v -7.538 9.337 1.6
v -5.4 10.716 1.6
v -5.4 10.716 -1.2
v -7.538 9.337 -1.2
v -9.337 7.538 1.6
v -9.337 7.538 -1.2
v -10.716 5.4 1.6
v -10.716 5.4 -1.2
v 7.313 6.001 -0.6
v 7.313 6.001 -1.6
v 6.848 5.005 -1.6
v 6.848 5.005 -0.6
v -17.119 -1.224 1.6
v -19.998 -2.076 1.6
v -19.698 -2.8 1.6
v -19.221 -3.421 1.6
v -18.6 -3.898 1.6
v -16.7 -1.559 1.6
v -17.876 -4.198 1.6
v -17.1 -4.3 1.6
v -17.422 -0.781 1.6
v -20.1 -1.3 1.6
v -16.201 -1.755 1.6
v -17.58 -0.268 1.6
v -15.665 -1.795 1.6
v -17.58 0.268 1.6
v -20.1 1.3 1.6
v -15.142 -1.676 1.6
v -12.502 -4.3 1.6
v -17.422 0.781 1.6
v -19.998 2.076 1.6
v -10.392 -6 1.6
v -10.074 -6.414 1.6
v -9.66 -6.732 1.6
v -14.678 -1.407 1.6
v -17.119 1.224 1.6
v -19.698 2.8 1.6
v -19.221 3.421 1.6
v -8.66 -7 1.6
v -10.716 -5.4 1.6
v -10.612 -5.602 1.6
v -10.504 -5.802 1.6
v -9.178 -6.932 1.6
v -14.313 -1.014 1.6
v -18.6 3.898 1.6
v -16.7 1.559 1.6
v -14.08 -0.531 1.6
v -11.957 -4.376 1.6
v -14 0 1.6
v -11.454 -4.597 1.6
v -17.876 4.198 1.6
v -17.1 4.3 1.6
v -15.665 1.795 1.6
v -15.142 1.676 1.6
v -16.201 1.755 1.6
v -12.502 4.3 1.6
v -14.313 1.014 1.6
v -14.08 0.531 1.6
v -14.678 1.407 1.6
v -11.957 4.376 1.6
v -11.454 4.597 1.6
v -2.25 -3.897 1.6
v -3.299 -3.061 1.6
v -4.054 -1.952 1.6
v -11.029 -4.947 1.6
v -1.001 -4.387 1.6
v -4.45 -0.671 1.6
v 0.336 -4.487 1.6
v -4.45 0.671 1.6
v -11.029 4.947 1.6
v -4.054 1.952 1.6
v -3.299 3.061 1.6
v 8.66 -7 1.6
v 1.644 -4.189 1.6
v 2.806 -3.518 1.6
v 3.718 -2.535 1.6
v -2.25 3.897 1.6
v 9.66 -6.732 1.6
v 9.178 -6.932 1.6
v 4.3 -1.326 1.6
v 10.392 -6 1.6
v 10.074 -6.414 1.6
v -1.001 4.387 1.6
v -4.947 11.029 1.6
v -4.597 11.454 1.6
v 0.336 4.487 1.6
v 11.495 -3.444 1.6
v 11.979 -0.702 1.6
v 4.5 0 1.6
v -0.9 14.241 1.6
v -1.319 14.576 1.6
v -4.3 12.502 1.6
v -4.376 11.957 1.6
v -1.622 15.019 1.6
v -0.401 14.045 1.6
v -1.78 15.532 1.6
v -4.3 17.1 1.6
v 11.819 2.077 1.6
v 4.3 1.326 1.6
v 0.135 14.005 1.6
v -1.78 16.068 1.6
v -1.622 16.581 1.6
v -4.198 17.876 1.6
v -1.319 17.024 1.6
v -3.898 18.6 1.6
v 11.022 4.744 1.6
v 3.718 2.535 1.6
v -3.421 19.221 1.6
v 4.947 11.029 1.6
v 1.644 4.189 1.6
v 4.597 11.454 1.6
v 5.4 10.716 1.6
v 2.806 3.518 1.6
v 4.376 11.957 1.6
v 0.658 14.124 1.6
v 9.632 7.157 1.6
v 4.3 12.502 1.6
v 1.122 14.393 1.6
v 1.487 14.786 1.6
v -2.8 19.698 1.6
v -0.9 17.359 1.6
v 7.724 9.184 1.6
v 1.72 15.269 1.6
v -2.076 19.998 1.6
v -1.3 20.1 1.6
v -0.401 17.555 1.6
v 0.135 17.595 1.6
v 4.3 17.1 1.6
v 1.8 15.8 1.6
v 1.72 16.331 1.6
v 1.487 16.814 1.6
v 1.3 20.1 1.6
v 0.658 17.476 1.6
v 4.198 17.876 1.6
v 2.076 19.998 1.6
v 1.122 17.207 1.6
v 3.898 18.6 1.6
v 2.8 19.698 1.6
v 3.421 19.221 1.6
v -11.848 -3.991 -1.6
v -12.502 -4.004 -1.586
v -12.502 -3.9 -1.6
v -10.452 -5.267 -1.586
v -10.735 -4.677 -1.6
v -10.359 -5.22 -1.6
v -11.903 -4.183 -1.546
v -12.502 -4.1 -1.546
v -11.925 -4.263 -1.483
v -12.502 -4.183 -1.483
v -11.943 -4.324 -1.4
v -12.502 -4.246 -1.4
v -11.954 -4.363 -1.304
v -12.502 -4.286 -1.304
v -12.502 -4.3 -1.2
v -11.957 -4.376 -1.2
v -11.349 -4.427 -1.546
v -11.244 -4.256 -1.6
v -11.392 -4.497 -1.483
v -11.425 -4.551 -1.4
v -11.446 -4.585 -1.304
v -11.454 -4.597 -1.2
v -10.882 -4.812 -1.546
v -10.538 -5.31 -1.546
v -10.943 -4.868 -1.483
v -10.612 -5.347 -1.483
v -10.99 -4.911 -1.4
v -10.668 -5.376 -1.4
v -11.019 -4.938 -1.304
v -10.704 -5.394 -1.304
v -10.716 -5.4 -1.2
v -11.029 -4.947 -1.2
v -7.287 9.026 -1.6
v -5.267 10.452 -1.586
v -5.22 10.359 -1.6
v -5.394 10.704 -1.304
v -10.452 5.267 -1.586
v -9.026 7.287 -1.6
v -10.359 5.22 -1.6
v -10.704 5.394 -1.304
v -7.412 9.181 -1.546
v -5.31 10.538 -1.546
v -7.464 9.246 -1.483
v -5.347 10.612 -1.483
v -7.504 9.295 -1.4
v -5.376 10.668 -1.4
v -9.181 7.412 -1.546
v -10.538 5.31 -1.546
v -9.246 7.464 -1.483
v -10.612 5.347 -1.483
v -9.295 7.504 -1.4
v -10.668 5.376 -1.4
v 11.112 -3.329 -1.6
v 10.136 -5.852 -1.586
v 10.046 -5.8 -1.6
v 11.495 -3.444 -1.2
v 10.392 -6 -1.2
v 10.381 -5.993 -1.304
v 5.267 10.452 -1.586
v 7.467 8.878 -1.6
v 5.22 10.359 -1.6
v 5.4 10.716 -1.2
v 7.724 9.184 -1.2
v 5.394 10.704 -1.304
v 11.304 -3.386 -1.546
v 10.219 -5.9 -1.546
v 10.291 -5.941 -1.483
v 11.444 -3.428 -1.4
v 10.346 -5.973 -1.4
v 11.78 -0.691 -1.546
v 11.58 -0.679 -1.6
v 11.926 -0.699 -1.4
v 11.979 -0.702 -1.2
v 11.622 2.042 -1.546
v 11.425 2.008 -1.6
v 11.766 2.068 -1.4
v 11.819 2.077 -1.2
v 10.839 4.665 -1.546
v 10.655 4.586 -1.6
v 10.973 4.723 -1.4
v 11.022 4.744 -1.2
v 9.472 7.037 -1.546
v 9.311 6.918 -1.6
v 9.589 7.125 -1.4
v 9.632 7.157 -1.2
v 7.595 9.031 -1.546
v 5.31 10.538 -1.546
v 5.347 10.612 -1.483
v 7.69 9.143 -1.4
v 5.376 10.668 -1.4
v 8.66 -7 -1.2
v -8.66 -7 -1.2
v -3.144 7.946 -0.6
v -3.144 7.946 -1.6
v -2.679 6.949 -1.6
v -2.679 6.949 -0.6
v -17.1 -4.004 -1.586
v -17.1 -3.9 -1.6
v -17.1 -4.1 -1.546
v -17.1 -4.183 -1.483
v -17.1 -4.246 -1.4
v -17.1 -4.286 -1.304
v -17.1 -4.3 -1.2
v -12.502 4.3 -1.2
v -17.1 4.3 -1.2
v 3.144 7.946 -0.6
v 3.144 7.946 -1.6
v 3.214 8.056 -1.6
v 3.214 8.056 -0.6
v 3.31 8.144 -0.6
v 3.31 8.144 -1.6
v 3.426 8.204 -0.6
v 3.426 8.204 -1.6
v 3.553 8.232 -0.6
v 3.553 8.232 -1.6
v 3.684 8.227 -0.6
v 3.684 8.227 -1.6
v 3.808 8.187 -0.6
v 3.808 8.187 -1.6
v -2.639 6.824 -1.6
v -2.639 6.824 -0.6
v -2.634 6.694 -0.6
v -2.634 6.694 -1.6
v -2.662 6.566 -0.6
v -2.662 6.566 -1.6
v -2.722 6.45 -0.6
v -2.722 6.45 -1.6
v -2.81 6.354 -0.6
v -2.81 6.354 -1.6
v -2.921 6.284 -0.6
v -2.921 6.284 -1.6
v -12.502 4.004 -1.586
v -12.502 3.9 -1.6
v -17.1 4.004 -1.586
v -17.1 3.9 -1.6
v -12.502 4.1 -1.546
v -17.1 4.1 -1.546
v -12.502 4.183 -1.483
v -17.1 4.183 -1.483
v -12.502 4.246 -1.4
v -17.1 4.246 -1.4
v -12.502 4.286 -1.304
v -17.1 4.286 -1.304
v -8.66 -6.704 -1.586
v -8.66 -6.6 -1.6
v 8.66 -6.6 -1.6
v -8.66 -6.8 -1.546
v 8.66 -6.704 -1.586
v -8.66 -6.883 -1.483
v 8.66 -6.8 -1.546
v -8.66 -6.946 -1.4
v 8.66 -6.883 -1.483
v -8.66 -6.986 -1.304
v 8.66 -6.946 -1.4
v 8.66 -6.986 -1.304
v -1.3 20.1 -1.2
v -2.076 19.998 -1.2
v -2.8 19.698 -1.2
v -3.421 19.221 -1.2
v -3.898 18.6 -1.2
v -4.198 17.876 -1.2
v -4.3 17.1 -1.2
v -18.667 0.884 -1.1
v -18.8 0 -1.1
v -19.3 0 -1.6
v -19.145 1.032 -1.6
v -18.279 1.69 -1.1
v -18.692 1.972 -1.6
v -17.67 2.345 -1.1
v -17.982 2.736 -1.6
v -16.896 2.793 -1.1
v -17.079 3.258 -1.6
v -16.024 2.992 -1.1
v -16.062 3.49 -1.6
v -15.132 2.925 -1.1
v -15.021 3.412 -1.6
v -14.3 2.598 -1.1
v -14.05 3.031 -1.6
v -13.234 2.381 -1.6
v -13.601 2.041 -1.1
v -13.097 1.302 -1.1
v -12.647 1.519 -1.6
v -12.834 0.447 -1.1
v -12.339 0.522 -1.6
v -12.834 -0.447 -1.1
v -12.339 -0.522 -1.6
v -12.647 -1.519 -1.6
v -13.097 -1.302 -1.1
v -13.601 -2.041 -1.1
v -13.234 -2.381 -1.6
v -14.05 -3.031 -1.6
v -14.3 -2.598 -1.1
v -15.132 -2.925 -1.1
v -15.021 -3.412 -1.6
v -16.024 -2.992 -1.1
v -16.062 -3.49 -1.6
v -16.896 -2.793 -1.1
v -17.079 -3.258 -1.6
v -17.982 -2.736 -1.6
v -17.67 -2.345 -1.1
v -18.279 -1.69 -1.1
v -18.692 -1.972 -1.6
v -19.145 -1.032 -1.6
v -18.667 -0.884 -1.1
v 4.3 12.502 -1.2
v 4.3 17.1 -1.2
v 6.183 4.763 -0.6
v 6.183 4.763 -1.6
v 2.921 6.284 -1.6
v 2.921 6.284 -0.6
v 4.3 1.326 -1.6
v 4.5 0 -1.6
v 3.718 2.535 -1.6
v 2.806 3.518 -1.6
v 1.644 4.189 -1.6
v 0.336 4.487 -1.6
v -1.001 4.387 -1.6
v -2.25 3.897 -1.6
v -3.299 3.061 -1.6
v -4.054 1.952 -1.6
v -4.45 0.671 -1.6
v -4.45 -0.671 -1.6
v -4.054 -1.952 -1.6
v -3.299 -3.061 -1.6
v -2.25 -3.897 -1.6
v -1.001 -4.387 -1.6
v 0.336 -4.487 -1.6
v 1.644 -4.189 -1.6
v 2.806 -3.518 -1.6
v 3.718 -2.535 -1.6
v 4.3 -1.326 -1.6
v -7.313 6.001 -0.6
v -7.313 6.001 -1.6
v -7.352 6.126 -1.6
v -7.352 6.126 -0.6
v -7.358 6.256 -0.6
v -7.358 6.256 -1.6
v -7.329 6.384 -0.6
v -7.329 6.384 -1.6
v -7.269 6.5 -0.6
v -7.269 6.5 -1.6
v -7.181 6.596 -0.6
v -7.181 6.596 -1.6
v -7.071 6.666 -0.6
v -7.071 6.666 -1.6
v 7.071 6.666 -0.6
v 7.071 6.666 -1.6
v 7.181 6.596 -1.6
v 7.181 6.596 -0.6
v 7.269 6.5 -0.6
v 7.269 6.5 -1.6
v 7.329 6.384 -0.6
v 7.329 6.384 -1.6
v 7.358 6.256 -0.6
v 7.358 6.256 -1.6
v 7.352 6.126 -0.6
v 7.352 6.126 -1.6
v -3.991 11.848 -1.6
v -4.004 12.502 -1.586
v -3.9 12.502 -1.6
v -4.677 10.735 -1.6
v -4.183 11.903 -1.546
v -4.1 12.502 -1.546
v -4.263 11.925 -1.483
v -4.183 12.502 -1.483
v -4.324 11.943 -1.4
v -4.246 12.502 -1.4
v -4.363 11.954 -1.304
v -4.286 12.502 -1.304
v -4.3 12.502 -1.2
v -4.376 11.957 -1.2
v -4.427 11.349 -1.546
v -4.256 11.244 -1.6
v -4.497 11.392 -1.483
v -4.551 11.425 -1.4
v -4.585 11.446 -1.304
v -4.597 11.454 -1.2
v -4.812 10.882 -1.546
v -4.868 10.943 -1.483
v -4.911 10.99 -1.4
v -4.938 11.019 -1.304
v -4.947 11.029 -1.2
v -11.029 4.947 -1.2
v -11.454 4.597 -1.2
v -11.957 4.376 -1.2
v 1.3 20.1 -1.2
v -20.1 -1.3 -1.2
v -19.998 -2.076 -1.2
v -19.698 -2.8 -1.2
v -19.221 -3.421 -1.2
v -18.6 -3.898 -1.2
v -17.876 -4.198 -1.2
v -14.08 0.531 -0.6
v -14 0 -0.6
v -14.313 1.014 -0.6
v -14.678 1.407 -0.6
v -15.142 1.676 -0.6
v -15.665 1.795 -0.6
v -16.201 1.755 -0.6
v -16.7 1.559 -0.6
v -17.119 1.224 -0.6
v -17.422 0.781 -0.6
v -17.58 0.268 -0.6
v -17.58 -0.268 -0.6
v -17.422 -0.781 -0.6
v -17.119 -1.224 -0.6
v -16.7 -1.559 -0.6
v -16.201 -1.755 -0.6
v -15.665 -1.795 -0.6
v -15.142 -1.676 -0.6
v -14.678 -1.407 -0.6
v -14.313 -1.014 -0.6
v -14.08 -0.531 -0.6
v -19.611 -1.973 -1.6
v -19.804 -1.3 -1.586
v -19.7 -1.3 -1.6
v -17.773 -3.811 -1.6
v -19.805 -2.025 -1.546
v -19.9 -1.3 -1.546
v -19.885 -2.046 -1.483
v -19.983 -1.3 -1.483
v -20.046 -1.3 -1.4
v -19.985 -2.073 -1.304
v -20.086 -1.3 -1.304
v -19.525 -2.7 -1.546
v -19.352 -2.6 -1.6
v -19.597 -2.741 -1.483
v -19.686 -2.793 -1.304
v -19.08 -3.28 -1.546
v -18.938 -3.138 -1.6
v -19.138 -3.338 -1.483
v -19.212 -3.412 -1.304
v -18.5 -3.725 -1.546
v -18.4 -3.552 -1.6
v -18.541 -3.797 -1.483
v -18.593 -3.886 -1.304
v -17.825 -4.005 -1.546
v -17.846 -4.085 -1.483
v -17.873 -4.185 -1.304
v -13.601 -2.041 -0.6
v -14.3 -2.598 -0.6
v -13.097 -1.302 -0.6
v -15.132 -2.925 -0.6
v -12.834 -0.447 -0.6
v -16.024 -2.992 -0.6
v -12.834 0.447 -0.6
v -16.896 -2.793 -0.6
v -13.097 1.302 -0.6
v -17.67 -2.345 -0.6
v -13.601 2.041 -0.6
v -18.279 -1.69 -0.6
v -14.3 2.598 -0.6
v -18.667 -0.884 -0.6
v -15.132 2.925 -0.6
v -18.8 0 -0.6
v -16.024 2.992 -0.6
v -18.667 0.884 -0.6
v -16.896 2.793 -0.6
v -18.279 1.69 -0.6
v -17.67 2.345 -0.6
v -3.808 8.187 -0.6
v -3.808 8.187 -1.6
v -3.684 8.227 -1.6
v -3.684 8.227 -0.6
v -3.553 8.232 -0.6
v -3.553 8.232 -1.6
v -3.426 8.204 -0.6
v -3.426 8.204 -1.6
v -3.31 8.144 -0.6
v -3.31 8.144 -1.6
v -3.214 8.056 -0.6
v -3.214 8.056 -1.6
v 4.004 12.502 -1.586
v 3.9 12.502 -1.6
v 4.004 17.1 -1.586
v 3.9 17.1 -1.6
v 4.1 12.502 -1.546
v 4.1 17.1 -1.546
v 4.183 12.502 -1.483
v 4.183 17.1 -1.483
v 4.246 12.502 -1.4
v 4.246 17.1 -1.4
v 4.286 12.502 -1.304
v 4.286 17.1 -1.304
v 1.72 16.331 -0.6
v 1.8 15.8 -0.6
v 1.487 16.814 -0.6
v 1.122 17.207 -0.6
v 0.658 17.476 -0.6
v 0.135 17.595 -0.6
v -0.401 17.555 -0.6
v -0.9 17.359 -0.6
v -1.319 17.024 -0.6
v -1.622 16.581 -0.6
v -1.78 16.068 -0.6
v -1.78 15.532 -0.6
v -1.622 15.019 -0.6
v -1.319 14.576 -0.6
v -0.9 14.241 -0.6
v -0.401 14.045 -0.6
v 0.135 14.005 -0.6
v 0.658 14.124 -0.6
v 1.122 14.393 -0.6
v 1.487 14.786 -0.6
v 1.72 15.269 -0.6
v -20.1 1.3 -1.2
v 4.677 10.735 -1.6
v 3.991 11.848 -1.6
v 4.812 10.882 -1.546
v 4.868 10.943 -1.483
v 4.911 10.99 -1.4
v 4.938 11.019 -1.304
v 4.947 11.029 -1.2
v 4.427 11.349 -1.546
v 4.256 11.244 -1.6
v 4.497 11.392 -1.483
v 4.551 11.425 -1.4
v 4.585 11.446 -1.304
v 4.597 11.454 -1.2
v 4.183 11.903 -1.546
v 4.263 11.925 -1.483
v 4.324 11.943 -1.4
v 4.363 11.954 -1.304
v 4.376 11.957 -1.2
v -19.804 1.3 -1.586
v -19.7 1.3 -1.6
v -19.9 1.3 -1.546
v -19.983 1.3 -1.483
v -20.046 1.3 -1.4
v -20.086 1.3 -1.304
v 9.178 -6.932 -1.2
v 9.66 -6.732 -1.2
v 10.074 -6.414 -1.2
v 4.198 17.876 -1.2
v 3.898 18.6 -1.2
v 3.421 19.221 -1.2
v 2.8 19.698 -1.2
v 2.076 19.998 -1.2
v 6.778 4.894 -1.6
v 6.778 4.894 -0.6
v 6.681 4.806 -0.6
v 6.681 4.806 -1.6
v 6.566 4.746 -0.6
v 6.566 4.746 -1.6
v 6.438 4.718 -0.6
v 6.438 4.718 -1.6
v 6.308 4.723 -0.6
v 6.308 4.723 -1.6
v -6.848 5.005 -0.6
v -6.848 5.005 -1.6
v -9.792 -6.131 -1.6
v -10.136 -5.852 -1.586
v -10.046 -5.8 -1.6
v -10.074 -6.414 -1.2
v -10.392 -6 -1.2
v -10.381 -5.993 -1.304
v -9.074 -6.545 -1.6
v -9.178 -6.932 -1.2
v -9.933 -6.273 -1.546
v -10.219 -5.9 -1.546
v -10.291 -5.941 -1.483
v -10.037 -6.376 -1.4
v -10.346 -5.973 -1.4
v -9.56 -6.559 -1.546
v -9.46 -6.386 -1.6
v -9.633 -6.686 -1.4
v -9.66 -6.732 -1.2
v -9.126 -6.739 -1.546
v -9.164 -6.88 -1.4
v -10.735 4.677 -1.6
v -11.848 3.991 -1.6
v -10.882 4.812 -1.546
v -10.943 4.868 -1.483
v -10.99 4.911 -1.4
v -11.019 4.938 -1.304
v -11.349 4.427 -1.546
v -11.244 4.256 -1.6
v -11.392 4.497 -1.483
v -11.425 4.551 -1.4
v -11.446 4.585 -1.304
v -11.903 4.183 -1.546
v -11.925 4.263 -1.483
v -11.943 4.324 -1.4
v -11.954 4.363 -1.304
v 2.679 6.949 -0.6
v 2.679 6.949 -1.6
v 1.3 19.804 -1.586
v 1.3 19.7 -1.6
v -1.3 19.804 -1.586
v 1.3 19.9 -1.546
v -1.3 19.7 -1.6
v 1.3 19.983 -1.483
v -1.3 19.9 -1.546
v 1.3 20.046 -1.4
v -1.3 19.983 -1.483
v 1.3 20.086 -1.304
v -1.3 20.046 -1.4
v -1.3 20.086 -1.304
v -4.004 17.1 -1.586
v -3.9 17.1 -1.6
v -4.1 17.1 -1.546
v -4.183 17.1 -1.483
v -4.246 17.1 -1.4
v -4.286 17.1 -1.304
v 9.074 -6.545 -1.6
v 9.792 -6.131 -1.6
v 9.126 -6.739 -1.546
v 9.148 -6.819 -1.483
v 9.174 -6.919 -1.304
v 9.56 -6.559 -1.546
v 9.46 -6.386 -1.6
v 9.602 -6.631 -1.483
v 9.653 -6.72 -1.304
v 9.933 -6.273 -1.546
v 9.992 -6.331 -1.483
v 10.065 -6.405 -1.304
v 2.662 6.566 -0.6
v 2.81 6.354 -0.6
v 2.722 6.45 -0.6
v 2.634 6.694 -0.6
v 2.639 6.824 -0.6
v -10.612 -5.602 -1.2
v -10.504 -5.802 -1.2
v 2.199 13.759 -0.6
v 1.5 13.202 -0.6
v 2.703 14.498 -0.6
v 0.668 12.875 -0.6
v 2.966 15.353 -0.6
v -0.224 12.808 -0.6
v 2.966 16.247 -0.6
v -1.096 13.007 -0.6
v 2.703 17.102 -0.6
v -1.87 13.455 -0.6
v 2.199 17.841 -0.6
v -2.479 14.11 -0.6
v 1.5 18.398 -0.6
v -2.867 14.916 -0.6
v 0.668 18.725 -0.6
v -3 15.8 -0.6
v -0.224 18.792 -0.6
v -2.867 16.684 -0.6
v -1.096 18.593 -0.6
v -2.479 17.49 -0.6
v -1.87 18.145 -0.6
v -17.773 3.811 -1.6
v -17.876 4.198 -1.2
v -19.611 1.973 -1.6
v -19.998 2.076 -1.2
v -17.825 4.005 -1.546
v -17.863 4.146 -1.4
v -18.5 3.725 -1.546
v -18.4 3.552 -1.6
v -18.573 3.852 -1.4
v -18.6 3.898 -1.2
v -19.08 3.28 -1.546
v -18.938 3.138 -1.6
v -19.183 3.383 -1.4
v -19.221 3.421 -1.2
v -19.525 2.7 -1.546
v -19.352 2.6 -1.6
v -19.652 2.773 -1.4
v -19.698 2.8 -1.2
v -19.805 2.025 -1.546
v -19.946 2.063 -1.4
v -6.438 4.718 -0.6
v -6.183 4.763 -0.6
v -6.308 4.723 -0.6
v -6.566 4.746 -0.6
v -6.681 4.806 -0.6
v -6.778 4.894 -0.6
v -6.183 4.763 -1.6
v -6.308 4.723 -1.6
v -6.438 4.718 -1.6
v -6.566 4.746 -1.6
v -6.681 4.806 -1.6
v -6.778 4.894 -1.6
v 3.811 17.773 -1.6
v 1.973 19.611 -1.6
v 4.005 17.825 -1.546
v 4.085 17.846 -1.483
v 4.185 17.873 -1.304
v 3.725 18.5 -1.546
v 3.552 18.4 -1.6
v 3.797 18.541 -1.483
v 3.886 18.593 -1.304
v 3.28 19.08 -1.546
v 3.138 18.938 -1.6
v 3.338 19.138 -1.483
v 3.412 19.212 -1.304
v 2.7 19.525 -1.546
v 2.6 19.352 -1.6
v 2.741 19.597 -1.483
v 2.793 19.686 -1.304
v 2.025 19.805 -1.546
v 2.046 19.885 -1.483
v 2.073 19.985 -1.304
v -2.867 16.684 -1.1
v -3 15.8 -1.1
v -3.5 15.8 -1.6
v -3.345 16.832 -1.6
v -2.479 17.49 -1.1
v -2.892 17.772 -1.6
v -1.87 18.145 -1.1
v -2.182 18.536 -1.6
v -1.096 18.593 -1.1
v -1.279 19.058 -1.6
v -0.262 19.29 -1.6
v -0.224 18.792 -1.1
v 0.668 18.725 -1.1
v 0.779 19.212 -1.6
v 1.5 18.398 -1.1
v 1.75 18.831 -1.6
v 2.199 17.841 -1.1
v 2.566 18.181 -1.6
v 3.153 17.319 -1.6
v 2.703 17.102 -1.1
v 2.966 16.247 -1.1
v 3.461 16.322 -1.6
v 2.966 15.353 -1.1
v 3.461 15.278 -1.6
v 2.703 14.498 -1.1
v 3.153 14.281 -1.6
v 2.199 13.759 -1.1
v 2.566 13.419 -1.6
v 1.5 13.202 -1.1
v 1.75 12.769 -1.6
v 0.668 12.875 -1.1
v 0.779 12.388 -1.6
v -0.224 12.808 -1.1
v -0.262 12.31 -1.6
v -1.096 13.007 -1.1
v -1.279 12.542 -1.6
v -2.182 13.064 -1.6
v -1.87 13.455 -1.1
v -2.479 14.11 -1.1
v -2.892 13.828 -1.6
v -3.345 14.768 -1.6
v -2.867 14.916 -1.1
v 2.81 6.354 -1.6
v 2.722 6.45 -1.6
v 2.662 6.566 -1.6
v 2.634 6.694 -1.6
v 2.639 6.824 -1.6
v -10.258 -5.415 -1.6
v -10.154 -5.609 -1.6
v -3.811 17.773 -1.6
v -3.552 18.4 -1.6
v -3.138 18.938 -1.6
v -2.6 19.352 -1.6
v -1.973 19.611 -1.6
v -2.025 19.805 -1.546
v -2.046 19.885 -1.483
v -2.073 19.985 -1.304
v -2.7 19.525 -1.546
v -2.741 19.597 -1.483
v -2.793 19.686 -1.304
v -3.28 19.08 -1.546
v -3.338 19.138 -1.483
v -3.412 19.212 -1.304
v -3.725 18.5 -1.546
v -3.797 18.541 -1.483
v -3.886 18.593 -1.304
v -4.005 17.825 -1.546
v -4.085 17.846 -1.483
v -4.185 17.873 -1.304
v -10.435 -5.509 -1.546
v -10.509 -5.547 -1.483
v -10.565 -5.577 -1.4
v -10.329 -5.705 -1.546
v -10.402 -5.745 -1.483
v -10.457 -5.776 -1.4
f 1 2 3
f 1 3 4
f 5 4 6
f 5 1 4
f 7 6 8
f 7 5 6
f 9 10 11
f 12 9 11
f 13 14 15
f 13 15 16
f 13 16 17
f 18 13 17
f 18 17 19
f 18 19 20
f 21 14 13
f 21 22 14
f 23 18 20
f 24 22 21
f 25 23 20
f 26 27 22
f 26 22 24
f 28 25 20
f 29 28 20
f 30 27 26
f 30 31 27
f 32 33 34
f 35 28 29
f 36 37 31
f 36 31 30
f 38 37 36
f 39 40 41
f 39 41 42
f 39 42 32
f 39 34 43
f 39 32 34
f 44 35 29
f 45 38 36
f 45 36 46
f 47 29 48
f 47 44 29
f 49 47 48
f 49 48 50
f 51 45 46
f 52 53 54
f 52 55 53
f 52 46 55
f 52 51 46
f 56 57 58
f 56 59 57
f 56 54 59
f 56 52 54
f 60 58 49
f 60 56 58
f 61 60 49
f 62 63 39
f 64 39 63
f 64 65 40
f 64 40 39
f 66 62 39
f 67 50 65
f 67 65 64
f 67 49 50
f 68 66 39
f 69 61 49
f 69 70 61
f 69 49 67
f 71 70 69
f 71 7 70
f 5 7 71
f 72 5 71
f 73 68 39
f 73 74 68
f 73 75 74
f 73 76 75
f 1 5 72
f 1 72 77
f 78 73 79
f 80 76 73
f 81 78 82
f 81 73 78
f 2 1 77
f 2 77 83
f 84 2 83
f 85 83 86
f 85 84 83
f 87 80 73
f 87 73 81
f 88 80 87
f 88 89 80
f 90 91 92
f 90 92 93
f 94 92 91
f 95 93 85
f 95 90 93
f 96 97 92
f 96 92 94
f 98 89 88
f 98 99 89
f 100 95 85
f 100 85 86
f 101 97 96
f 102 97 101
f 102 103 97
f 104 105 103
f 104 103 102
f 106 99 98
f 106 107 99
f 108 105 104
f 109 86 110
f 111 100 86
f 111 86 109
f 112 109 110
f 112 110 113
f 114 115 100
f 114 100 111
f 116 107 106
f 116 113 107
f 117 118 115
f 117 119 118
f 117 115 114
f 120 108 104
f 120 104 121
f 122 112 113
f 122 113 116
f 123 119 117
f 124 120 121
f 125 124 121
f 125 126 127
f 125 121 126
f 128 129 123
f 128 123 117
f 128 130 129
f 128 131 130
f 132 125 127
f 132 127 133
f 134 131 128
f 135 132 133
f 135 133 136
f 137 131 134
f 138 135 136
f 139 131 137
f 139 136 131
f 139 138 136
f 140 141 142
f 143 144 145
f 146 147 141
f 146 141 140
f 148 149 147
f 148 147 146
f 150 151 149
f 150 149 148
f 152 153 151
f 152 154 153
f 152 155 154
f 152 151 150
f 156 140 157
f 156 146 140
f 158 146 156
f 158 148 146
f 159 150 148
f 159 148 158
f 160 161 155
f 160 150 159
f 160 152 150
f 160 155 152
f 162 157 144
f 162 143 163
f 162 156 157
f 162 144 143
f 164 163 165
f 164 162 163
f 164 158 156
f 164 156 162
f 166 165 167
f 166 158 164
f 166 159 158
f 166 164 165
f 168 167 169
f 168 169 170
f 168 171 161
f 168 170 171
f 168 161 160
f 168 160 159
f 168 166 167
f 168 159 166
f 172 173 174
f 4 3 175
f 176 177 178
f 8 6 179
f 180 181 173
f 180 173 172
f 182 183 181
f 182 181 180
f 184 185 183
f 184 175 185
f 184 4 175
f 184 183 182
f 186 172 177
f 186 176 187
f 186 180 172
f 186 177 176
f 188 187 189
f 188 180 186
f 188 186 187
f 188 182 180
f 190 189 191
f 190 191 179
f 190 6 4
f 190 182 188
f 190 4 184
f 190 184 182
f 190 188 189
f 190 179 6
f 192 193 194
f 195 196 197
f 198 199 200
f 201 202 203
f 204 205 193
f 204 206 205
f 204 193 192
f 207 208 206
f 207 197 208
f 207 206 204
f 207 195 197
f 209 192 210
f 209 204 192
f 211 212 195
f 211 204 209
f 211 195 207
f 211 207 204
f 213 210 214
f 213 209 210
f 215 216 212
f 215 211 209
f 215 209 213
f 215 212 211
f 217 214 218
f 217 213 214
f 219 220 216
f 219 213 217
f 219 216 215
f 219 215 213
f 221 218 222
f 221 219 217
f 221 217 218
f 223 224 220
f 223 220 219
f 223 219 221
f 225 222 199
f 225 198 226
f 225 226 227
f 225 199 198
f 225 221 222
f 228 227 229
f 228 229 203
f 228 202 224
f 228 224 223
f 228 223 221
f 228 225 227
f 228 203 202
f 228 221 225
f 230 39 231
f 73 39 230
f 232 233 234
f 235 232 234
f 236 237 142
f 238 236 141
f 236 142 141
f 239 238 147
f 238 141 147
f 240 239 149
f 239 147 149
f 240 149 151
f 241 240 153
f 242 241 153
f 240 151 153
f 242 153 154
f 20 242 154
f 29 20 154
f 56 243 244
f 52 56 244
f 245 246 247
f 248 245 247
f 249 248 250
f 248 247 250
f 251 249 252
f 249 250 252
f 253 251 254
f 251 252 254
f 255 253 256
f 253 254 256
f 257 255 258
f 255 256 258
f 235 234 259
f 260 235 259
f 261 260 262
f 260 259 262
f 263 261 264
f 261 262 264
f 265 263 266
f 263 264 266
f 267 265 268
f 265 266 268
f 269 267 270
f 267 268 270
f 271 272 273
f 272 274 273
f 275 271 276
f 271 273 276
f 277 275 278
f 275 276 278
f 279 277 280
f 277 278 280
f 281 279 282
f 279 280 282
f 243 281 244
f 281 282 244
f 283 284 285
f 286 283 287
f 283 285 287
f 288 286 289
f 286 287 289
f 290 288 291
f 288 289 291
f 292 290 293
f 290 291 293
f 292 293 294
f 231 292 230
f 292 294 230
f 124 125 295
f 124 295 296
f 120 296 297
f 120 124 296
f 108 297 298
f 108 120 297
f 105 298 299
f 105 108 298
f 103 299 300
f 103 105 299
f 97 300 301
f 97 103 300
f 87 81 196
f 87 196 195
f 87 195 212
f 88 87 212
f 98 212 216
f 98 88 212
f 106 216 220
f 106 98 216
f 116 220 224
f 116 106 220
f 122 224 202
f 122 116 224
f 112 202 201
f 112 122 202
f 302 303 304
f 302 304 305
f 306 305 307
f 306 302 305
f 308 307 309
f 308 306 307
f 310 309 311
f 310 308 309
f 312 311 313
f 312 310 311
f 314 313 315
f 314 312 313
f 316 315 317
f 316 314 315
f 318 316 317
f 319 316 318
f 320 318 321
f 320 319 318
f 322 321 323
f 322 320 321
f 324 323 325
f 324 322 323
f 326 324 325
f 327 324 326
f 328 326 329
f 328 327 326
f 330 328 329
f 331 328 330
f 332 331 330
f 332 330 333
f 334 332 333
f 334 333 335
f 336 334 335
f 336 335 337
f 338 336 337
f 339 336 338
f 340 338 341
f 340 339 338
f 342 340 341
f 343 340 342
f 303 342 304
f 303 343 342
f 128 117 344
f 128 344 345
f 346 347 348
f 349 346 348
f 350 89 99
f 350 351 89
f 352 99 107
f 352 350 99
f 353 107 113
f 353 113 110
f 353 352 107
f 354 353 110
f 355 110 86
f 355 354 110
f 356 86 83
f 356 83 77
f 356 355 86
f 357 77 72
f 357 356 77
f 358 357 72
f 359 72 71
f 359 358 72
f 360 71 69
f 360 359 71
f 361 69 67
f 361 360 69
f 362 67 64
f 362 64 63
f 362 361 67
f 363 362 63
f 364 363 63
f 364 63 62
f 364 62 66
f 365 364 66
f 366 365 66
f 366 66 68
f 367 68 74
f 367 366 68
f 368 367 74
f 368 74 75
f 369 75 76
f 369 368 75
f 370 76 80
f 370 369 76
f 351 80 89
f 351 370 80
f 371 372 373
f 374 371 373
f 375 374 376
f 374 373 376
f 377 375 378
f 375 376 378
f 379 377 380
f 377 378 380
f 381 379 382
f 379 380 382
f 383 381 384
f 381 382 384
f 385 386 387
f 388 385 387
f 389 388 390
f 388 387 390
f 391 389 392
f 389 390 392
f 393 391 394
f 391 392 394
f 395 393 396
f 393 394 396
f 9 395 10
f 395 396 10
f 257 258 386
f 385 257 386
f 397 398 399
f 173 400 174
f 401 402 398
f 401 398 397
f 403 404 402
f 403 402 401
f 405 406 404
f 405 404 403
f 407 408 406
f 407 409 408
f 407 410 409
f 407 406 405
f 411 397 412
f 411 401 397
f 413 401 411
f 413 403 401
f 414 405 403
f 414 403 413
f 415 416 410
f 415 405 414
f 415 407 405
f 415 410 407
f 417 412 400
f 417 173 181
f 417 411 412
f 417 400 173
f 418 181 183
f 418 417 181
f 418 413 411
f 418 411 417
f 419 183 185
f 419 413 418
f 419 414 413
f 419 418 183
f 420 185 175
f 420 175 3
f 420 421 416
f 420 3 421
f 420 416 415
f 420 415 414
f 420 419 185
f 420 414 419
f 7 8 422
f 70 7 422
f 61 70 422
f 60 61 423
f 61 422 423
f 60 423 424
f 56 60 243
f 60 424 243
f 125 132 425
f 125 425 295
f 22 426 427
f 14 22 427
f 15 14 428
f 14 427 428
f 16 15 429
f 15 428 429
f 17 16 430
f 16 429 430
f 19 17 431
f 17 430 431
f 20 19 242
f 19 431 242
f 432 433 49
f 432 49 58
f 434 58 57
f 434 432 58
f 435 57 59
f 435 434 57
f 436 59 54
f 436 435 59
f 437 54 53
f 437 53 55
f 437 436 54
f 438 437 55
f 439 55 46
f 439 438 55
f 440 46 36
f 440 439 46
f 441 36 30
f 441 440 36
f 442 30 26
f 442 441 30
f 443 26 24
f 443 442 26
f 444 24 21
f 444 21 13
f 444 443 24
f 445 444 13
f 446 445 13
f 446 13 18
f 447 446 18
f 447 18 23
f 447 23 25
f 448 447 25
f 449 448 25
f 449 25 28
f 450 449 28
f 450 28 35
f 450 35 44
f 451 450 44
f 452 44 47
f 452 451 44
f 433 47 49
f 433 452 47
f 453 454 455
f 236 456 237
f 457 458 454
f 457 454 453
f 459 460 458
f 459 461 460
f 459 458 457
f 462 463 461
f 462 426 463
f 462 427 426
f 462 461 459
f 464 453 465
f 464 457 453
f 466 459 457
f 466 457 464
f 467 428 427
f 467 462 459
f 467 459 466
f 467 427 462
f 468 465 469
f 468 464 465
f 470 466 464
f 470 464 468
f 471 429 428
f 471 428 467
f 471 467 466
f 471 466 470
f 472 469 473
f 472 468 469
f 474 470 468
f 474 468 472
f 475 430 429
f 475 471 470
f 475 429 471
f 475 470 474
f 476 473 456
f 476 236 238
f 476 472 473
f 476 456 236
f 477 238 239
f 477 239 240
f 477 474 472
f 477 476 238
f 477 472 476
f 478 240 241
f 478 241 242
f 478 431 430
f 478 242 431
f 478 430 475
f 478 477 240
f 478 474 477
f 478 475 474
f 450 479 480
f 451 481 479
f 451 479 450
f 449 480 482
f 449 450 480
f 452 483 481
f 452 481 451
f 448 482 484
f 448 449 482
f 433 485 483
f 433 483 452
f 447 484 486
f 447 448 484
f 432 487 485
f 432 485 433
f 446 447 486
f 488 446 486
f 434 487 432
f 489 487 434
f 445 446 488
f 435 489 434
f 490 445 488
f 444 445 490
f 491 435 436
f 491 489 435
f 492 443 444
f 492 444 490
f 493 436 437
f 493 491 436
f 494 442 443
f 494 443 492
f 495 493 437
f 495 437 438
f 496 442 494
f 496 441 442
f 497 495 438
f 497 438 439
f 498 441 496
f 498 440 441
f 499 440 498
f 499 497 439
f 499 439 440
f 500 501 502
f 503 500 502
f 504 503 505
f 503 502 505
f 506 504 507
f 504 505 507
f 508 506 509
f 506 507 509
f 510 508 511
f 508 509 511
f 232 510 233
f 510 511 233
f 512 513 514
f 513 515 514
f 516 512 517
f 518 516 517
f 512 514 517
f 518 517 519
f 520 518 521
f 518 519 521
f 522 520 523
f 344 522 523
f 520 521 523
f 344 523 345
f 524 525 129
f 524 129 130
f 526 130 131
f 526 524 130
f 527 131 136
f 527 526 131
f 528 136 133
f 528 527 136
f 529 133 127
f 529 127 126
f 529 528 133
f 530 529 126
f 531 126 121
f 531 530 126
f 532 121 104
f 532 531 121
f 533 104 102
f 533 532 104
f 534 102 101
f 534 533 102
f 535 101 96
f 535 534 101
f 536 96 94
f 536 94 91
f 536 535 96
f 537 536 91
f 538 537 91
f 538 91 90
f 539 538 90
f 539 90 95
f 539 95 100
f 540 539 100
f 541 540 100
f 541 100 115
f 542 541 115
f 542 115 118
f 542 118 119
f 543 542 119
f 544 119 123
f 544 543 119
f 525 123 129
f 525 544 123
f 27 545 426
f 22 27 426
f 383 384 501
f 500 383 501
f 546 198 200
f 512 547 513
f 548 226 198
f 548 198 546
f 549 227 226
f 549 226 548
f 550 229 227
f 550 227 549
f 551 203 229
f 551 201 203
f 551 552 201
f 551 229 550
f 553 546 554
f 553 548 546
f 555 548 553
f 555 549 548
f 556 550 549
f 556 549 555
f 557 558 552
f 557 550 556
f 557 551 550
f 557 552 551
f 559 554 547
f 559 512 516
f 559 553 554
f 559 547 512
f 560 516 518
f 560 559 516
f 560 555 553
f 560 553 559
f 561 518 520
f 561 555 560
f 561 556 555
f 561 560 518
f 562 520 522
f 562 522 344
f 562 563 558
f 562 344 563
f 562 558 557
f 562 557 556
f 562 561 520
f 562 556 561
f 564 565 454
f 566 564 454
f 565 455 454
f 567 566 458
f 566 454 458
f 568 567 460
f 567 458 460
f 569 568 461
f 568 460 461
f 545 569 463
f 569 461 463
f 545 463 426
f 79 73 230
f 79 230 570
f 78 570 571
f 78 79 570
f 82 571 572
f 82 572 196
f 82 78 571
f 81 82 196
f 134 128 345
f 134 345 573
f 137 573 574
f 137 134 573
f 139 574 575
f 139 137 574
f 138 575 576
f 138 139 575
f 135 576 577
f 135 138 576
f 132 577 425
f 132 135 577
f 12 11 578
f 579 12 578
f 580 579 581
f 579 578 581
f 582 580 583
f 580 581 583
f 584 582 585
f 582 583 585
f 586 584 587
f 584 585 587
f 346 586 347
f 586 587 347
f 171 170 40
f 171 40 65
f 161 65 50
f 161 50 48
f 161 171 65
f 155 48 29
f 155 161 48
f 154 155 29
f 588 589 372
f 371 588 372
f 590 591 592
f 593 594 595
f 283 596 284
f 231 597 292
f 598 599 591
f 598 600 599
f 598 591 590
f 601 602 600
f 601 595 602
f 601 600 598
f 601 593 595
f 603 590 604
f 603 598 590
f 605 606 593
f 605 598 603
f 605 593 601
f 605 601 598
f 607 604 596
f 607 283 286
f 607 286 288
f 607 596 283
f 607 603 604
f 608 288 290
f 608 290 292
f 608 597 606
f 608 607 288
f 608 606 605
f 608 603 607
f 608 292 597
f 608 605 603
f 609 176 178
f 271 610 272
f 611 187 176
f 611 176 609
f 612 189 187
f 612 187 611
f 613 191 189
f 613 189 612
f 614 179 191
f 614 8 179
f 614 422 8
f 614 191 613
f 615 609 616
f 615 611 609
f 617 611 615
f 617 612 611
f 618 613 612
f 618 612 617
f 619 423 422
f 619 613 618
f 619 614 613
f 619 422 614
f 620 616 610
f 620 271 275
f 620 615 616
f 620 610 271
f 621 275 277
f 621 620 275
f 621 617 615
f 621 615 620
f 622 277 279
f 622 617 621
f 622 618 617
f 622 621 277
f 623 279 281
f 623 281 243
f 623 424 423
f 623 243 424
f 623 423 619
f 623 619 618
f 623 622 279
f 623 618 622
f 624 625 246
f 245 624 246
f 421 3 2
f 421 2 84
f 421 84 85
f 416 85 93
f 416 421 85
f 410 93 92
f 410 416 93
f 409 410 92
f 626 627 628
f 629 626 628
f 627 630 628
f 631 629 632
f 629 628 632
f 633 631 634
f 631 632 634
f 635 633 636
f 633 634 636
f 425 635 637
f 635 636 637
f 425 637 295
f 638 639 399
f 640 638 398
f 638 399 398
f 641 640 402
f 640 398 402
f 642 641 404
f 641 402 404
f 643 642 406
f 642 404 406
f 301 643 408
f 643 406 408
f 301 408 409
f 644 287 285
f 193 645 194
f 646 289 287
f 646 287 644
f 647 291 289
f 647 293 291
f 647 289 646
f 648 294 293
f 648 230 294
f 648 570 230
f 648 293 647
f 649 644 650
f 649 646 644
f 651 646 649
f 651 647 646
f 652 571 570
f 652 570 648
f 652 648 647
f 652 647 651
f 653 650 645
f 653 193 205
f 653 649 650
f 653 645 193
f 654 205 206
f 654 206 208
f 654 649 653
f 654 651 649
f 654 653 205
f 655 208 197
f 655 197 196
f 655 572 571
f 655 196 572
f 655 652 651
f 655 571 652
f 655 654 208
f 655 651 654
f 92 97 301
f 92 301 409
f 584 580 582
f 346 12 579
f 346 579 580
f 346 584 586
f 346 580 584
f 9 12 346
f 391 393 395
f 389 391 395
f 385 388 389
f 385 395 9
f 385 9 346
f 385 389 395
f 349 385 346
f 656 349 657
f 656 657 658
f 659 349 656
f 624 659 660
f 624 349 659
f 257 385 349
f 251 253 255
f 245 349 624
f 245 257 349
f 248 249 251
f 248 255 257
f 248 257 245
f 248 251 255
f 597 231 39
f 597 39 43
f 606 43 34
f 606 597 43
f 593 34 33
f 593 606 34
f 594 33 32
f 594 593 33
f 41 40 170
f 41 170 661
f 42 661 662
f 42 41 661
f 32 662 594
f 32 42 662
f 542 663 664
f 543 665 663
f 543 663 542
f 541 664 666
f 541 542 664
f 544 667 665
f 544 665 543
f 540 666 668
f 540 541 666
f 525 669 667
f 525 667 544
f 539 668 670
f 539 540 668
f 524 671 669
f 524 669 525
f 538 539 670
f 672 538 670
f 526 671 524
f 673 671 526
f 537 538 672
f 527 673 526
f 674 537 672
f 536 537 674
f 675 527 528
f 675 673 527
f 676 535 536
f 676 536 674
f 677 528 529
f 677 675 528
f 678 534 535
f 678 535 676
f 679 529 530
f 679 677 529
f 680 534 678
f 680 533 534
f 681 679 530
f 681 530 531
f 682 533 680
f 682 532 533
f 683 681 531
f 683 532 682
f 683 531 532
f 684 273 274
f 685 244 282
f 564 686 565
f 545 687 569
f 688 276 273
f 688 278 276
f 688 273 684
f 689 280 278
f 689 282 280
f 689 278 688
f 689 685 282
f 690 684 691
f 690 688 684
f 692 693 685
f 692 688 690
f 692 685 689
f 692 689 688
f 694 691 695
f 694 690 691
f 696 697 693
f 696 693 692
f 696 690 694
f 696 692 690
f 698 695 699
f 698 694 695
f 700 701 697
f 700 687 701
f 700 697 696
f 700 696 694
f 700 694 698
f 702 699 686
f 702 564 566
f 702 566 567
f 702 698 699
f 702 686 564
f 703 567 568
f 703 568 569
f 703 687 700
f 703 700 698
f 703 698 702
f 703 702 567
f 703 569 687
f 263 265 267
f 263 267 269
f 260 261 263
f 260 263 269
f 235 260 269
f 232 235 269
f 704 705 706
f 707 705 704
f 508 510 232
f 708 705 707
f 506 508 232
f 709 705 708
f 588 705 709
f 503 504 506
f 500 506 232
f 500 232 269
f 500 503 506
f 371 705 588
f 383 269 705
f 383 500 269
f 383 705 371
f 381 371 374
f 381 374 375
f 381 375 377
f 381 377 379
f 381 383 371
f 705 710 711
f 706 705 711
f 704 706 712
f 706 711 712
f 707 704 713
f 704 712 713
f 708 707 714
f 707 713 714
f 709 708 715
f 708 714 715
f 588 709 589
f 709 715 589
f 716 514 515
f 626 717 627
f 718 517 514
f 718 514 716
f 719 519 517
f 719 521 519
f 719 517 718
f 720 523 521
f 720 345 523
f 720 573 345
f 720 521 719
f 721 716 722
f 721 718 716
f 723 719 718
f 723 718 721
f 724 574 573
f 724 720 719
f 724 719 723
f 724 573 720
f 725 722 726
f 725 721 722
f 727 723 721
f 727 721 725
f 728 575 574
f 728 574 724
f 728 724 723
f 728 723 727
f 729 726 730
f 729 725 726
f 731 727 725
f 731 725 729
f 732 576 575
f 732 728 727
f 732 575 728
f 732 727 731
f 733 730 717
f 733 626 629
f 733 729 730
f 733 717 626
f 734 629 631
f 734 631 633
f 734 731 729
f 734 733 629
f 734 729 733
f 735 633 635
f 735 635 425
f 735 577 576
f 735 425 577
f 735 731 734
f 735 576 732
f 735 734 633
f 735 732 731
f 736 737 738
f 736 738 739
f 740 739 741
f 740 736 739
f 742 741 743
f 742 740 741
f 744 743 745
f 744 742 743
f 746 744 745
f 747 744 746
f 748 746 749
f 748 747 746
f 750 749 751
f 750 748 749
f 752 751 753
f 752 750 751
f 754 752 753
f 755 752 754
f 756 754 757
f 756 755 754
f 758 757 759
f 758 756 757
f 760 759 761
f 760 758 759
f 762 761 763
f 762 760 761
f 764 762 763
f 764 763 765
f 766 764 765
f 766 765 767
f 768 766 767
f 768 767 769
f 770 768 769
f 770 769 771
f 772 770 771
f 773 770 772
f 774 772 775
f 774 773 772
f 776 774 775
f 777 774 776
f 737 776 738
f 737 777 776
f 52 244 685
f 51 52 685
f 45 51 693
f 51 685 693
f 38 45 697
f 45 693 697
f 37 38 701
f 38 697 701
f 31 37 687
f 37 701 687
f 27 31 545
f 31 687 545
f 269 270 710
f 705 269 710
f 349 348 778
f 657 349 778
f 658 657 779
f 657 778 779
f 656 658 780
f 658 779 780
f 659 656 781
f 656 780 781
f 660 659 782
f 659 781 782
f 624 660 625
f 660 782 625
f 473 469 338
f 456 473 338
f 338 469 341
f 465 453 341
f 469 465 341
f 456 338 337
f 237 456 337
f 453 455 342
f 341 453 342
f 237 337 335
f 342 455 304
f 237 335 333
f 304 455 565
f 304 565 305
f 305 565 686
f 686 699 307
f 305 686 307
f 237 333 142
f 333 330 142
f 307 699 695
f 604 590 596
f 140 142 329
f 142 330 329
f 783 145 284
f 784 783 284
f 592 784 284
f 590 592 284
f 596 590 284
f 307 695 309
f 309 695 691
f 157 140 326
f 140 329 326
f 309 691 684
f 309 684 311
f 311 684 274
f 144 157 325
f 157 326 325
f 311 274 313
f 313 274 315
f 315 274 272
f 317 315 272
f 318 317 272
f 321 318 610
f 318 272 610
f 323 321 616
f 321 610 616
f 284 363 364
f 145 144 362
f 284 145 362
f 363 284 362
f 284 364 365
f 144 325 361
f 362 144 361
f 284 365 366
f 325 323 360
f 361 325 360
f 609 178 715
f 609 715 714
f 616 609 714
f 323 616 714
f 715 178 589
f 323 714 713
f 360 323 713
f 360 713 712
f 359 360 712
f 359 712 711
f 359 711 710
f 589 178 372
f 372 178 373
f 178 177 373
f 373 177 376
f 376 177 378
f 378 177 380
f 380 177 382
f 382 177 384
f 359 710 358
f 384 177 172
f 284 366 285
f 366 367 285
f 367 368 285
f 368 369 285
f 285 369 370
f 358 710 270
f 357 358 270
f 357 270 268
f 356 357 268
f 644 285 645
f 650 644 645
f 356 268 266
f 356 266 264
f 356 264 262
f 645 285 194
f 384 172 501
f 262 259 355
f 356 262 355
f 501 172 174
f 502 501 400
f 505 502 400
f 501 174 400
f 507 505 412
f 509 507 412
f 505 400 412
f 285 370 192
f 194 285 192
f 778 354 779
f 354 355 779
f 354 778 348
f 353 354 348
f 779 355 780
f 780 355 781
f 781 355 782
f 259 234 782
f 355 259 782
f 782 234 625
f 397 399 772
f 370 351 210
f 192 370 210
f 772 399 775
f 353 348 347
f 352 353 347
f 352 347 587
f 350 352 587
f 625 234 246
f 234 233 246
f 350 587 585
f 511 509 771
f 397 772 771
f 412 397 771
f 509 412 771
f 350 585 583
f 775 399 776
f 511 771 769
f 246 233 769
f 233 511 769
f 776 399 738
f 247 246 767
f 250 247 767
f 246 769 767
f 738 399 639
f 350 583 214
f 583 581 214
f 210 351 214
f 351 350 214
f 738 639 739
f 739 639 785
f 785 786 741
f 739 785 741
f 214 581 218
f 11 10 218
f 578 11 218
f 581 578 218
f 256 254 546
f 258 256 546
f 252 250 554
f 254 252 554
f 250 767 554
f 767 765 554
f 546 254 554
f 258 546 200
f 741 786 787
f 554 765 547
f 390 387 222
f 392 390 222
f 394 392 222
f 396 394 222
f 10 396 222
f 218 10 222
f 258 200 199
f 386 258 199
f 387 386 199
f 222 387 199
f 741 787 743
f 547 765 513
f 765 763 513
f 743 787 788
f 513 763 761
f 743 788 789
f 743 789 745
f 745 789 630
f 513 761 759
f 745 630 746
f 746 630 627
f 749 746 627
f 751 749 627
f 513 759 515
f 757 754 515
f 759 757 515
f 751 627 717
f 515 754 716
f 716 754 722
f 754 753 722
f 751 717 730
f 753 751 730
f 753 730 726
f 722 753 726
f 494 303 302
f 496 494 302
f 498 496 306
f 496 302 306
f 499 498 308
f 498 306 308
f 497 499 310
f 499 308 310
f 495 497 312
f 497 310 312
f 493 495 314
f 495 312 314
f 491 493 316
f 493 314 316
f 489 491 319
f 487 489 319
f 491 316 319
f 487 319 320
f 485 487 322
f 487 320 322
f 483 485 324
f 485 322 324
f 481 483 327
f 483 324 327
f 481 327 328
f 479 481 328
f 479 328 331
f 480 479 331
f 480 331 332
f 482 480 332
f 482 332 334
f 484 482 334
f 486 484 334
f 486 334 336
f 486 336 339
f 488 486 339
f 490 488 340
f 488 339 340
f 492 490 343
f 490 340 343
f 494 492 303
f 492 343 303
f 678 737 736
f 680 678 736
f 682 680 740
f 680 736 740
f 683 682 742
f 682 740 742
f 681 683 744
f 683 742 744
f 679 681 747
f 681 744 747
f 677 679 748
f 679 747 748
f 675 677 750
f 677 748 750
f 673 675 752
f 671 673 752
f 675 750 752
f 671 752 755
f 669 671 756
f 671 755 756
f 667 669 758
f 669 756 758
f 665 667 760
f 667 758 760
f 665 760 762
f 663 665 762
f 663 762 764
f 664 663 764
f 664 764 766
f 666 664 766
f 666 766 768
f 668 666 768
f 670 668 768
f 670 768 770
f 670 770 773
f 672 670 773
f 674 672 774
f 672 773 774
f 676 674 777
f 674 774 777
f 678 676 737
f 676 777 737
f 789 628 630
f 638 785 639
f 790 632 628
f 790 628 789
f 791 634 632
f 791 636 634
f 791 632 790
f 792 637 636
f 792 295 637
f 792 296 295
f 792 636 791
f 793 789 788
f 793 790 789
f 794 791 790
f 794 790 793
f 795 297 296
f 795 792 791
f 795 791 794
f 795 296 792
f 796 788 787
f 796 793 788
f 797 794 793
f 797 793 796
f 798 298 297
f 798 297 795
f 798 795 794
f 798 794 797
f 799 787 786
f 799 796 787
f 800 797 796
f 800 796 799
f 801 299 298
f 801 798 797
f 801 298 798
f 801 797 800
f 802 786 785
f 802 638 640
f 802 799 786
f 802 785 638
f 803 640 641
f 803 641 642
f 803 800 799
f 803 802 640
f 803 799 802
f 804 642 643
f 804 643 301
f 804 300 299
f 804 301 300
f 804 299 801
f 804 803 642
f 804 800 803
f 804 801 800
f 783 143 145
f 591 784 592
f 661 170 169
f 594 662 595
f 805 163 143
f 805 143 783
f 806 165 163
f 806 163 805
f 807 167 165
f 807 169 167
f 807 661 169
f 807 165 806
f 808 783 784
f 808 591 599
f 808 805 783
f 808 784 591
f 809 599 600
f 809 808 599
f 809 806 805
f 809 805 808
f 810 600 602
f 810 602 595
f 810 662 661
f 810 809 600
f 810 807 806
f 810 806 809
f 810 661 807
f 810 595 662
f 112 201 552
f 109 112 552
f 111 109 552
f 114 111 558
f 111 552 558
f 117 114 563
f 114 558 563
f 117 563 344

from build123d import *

# Parameters (mm, degrees)
SKETCH10_R          = 4.5
BOSS_EXTRUDE6_DEPTH = 1.6
SKETCH13_R          = 1.8
BOSS_EXTRUDE7_DEPTH = 1.6
FILLET1_R           = 2
CUT_EXTRUDE2_DEPTH  = 1
SKETCH16_R          = 3
CUT_EXTRUDE3_DEPTH  = 1
CHAMFER1_SIZE       = 0.5
FILLET2_R           = 0.4


with BuildPart() as part:
    # Sketch10 → Boss-Extrude6 (new body, symmetric)
    with BuildSketch(Plane.XY):
        with BuildLine():
            Line((-9.746794345, -7), (9.746794345, -7))
            ThreePointArc((9.746794345, -7), (0, 12), (-9.746794345, -7))
        make_face()
        Circle(SKETCH10_R, mode=Mode.SUBTRACT)
    extrude(amount=BOSS_EXTRUDE6_DEPTH, both=True)

    # Sketch13 → Boss-Extrude7 (add, symmetric)
    with BuildSketch(Plane.XY):
        with BuildLine():
            Line((-11.203124564, 4.3), (-17.1, 4.3))
            ThreePointArc((-17.1, 4.3), (-19.221320344, 3.421320344), (-20.1, 1.3))
            Line((-20.1, 1.3), (-20.1, -1.3))
            ThreePointArc((-20.1, -1.3), (-19.221320344, -3.421320344), (-17.1, -4.3))
            Line((-17.1, -4.3), (-11.203124564, -4.3))
            ThreePointArc((-11.203124564, -4.3), (-12, 0), (-11.203124564, 4.3))
        make_face()
        with Locations((-15.8, 0)):
            Circle(SKETCH13_R, mode=Mode.SUBTRACT)
        with BuildLine():
            Line((4.3, 11.203124564), (4.3, 17.1))
            ThreePointArc((4.3, 17.1), (3.421320344, 19.221320344), (1.3, 20.1))
            Line((1.3, 20.1), (-1.3, 20.1))
            ThreePointArc((-1.3, 20.1), (-3.421320344, 19.221320344), (-4.3, 17.1))
            Line((-4.3, 17.1), (-4.3, 11.203124564))
            ThreePointArc((-4.3, 11.203124564), (0, 12), (4.3, 11.203124564))
        make_face()
        with Locations((0, 15.8)):
            Circle(SKETCH13_R, mode=Mode.SUBTRACT)
    extrude(amount=BOSS_EXTRUDE7_DEPTH, both=True)

    # Fillet1
    fillet1_edges = [part.edges().sort_by_distance(p)[0] for p in [
        (-11.203124564, -4.3, 0),
        (-11.203124564, 4.3, 0),
        (-4.3, 11.203124564, 0),
        (4.3, 11.203124564, 0),
        (9.746794345, -7, 0),
        (-9.746794345, -7, 0),
    ]]
    fillet(fillet1_edges, radius=FILLET1_R)

    # Sketch15 → Cut-Extrude2 (cut)
    with BuildSketch(Plane(origin=(0, 0, -1.6), x_dir=(-1, 0, 0), z_dir=(0, 0, -1))):
        with BuildLine():
            Line((-3.808047036, 8.187368684), (-7.070755069, 6.665942941))
            ThreePointArc((-7.070755069, 6.665942941), (-7.329292249, 6.38379912), (-7.312599832, 6.001479917))
            Line((-7.312599832, 6.001479917), (-6.847719744, 5.004541351))
            ThreePointArc((-6.847719744, 5.004541351), (-6.565575922, 4.746004172), (-6.18325672, 4.762696589))
            Line((-6.18325672, 4.762696589), (-2.920548686, 6.284122331))
            ThreePointArc((-2.920548686, 6.284122331), (-2.662011507, 6.566266153), (-2.678703924, 6.948585355))
            Line((-2.678703924, 6.948585355), (-3.143584012, 7.945523921))
            ThreePointArc((-3.143584012, 7.945523921), (-3.425727833, 8.204061101), (-3.808047036, 8.187368684))
        make_face()
        with BuildLine():
            Line((6.847719744, 5.004541351), (7.312599832, 6.001479917))
            ThreePointArc((7.312599832, 6.001479917), (7.329292249, 6.38379912), (7.070755069, 6.665942941))
            Line((7.070755069, 6.665942941), (3.808047036, 8.187368684))
            ThreePointArc((3.808047036, 8.187368684), (3.425727833, 8.204061101), (3.143584012, 7.945523921))
            Line((3.143584012, 7.945523921), (2.678703924, 6.948585355))
            ThreePointArc((2.678703924, 6.948585355), (2.662011507, 6.566266153), (2.920548686, 6.284122331))
            Line((2.920548686, 6.284122331), (6.18325672, 4.762696589))
            ThreePointArc((6.18325672, 4.762696589), (6.565575922, 4.746004172), (6.847719744, 5.004541351))
        make_face()
    extrude(amount=-CUT_EXTRUDE2_DEPTH, mode=Mode.SUBTRACT)

    # Sketch16 → Cut-Extrude3 (cut)
    with BuildSketch(Plane(origin=(0, 0, -1.6), x_dir=(-1, 0, 0), z_dir=(0, 0, -1))):
        with Locations((0, 15.8)):
            Circle(SKETCH16_R)
        with Locations((15.8, 0)):
            Circle(SKETCH16_R)
    extrude(amount=-CUT_EXTRUDE3_DEPTH, mode=Mode.SUBTRACT)

    # Chamfer1
    chamfer1_edges = [part.edges().sort_by_distance(p)[0] for p in [
        (3, 15.8, -1.6),
        (-12.8, 0, -1.6),
    ]]
    chamfer(chamfer1_edges, length=CHAMFER1_SIZE)

    # Fillet2
    fillet2_edges = [part.edges().sort_by_distance(p)[0] for p in [
        (-19.221320344, 3.421320344, -1.6),
        (-20.1, 0, -1.6),
        (-19.221320344, -3.421320344, -1.6),
        (-14.801199885, -4.3, -1.6),
        (3.421320344, 19.221320344, -1.6),
        (0, 20.1, -1.6),
        (-3.421320344, 19.221320344, -1.6),
        (-4.3, 14.801199885, -1.6),
        (-14.801199885, 4.3, -1.6),
        (-8.485281374, 8.485281374, -1.6),
        (4.3, 14.801199885, -1.6),
        (11.498184685, 3.433911609, -1.6),
        (-10.558586547, -5.702302178, -1.6),
        (0, -7, -1.6),
        (-9.660254038, -6.732050808, -1.6),
        (9.660254038, -6.732050808, -1.6),
        (-11.453590921, 4.597061363, -1.6),
        (4.597061363, 11.453590921, -1.6),
        (-4.597061363, 11.453590921, -1.6),
        (-11.453590921, -4.597061363, -1.6),
    ]]
    fillet(fillet2_edges, radius=FILLET2_R)


solid = part.part
